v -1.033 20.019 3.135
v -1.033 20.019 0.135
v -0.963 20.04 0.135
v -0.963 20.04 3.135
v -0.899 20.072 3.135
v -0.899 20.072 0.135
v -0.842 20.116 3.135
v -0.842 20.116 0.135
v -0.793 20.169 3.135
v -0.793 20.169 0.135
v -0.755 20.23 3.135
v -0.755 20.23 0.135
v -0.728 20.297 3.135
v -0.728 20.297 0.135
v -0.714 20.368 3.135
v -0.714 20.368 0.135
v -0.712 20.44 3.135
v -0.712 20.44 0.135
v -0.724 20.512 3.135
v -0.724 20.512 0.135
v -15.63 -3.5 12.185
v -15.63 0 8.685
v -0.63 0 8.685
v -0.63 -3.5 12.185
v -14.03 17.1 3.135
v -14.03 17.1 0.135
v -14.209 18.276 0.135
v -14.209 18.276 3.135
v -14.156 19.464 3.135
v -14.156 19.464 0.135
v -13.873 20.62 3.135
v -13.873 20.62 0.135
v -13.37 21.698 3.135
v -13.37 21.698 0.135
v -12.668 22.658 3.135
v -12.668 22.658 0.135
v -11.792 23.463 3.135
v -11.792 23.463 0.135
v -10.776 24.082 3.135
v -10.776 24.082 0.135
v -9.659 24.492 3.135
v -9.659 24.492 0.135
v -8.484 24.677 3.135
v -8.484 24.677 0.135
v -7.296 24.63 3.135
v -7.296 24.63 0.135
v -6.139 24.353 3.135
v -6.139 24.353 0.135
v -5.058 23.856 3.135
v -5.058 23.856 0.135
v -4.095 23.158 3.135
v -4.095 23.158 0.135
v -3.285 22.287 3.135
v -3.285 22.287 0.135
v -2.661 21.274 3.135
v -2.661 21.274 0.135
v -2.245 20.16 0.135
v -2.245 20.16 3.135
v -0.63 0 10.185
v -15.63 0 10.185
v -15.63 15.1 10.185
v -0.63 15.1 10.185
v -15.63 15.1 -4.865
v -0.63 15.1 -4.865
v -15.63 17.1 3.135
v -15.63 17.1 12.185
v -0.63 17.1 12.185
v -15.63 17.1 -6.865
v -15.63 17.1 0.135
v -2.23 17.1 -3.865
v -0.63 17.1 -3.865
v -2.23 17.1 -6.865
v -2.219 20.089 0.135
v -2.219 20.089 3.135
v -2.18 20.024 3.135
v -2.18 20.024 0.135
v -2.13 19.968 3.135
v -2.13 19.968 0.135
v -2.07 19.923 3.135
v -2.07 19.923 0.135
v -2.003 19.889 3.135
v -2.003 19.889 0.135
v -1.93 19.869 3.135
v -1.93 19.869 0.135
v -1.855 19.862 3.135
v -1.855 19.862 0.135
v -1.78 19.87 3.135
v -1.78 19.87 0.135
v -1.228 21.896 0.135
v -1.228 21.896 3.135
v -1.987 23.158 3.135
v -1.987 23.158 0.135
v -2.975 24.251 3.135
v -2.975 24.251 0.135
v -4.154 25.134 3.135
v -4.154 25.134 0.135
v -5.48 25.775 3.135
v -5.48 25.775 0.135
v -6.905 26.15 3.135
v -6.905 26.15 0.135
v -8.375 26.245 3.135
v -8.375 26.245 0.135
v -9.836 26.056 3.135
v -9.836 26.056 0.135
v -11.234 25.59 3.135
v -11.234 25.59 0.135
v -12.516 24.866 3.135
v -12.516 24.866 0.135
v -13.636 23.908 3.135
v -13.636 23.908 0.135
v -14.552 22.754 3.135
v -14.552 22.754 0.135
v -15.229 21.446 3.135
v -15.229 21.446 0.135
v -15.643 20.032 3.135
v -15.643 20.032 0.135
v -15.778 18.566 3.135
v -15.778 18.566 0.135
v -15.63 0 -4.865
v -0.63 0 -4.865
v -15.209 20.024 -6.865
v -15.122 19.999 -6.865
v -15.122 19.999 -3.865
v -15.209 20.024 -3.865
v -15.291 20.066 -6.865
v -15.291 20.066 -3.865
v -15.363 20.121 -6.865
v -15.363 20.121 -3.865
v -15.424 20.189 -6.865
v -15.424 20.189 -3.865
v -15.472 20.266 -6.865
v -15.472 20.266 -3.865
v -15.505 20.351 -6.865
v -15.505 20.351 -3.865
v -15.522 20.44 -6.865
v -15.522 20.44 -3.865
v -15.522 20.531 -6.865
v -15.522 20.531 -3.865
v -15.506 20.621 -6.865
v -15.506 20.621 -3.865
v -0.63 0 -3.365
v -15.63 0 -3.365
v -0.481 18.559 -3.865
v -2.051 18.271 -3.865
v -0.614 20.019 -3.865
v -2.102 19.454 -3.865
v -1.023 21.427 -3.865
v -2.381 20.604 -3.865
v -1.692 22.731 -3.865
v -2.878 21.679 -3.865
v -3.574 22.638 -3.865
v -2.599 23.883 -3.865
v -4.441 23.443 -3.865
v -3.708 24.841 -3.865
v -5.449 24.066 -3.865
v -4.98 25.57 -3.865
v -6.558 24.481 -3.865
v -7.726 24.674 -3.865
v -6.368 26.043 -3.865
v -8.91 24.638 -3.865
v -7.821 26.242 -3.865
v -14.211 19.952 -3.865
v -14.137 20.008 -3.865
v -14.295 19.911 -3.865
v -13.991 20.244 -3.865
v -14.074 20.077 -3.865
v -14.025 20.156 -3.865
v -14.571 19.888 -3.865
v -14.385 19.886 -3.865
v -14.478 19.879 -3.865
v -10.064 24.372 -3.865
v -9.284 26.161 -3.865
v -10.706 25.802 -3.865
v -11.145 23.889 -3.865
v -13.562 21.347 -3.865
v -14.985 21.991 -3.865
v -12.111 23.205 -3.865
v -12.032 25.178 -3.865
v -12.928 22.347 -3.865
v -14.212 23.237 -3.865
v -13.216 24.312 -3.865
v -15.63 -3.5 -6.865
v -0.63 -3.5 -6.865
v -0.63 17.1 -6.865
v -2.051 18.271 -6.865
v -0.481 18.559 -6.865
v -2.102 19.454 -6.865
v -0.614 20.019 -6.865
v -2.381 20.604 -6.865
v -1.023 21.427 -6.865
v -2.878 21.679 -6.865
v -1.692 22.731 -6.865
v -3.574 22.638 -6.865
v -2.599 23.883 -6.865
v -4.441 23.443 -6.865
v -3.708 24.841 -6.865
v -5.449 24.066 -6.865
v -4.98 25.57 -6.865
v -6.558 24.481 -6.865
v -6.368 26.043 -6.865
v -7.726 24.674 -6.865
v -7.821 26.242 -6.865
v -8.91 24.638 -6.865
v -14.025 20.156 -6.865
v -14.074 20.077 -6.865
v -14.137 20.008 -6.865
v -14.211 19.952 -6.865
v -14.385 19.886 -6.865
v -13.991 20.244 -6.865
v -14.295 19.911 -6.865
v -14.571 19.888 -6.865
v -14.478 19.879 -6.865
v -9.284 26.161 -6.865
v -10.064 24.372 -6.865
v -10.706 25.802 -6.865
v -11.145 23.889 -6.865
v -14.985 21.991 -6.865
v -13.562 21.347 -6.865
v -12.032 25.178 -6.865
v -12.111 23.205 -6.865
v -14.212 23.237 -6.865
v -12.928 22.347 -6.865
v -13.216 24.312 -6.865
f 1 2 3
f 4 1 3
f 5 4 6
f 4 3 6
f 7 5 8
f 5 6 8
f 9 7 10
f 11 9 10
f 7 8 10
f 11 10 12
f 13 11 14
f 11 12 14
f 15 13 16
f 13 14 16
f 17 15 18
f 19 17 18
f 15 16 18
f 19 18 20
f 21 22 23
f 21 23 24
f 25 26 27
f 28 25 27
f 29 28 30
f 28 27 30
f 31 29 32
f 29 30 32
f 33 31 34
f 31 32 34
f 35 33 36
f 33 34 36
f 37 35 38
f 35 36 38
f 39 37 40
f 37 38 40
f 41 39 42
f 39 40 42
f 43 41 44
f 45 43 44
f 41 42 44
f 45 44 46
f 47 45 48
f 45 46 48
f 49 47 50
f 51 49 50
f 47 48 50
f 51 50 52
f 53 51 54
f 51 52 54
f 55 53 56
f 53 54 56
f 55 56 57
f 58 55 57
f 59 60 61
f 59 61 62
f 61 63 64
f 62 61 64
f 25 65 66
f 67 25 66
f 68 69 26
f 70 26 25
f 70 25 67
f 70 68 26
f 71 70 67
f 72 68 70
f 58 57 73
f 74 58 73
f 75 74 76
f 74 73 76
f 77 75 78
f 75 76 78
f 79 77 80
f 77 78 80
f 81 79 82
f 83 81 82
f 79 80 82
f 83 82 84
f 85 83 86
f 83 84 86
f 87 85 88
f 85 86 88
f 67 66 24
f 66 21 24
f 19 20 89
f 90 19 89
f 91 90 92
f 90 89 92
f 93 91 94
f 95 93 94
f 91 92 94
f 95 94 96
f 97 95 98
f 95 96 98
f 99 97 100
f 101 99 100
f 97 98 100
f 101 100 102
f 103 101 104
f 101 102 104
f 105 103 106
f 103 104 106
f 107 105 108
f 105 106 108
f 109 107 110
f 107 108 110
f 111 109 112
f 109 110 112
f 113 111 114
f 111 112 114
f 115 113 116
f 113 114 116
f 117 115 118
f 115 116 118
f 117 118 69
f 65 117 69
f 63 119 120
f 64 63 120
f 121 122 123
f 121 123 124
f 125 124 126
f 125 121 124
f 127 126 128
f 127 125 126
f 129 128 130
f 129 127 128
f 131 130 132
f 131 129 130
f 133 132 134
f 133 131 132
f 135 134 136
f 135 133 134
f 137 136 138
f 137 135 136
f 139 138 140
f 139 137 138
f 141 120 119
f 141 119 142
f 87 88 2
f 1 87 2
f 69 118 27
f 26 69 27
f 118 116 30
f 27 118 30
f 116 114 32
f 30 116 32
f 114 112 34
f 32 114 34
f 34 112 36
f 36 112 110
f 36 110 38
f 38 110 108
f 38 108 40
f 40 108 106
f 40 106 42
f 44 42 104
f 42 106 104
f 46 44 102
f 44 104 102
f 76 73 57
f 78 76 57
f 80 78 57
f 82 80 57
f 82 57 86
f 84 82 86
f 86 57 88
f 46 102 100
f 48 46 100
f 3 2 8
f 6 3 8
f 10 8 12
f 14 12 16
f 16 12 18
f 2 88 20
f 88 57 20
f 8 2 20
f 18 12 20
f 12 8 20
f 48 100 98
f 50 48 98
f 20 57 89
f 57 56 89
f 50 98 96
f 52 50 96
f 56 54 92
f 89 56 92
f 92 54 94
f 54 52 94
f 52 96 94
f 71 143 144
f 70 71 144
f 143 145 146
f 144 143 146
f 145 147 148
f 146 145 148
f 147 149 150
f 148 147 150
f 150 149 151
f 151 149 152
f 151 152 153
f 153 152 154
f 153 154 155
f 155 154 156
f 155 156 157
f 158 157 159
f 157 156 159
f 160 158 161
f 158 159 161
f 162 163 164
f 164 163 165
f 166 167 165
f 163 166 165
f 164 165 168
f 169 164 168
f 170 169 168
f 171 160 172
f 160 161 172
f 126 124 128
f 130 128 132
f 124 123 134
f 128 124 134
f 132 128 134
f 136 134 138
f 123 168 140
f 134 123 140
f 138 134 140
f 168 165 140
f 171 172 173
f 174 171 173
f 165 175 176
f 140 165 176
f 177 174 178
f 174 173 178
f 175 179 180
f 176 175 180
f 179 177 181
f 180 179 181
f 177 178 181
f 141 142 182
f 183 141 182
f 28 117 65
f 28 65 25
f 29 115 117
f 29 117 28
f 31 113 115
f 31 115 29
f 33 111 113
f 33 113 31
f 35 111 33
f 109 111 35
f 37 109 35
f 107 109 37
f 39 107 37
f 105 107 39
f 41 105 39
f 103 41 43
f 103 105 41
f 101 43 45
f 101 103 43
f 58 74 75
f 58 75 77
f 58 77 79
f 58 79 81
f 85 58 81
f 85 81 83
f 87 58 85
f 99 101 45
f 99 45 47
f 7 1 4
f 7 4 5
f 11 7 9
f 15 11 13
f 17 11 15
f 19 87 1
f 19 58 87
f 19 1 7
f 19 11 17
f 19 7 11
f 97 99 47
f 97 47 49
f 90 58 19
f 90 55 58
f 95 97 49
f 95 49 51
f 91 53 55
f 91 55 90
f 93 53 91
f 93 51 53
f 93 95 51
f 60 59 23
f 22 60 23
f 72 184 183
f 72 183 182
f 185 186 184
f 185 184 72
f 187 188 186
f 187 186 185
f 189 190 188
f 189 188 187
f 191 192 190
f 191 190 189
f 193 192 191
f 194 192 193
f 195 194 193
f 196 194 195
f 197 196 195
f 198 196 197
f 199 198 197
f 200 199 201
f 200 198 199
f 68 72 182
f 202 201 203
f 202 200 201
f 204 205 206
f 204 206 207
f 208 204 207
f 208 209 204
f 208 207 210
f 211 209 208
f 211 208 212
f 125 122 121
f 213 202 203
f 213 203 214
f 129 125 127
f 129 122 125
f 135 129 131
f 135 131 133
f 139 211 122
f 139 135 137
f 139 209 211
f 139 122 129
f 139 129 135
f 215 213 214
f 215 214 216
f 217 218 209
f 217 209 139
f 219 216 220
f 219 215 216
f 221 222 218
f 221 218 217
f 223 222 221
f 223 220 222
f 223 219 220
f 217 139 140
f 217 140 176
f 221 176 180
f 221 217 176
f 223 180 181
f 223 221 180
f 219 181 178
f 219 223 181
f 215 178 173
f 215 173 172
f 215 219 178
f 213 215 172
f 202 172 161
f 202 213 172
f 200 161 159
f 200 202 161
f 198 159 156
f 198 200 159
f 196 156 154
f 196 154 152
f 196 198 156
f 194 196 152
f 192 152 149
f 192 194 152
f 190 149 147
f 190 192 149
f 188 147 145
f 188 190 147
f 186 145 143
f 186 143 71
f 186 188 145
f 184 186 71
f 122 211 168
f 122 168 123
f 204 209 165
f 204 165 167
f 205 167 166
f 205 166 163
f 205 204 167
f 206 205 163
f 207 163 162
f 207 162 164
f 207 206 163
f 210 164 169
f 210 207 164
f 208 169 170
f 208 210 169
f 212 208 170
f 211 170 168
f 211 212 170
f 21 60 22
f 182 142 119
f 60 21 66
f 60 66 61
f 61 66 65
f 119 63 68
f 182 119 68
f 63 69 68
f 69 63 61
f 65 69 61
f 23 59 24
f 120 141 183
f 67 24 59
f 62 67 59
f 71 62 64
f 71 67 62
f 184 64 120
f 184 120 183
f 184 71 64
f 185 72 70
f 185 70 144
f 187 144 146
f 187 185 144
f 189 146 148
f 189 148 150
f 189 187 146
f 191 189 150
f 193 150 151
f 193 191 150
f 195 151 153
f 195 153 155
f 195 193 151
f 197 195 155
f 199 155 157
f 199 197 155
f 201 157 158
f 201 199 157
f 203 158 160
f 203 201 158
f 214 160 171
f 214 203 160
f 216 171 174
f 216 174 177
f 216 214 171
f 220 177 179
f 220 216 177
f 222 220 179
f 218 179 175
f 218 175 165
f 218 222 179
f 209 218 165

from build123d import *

# Parameters (mm, degrees)
SKETCH_1_W        = 15
SKETCH_1_H        = 2
EXTRUDE_1_DEPTH   = 15.1
EXTRUDE_1_2_DEPTH = 15.1
SKETCH_2_W        = 15
SKETCH_2_H        = 19.05
EXTRUDE_2_DEPTH   = 2
EXTRUDE_3_DEPTH   = 15
EXTRUDE_4_DEPTH   = 3
EXTRUDE_5_DEPTH   = 3


with BuildPart() as part:
    # 草图1 → 凸台-拉伸1 (new body)
    with BuildSketch(Plane(origin=(0, 0, 0), x_dir=(1, 0, 0), z_dir=(0, 1, 0))):
        with Locations((-8.12962963, 5.864814815)):
            Rectangle(SKETCH_1_W, SKETCH_1_H)
    extrude(amount=EXTRUDE_1_DEPTH)



with BuildPart() as body_2:
    # 草图1 → Extrude 1 2 (new body)
    with BuildSketch(Plane(origin=(0, 0, 0), x_dir=(1, 0, 0), z_dir=(0, 1, 0))):
        with Locations((-8.12962963, -11.185185185)):
            Rectangle(SKETCH_1_W, SKETCH_1_H)
    extrude(amount=EXTRUDE_1_2_DEPTH)


with BuildPart() as part_1:
    add(part.part)

    add(body_2.part)  # 凸台-拉伸2 merges body 2
    # 草图2 → 凸台-拉伸2 (add)
    with BuildSketch(Plane(origin=(0, 15.1, 0), x_dir=(1, 0, 0), z_dir=(0, 1, 0))):
        with Locations((-8.12962963, -2.660185185)):
            Rectangle(SKETCH_2_W, SKETCH_2_H)
    extrude(amount=EXTRUDE_2_DEPTH)

    # 草图3 → 凸台-拉伸3 (add)
    with BuildSketch(Plane.ZY.offset(15.62962963)):
        Polygon((-6.864814815, 0), (-3.364814815, 0), (-6.864814815, -3.5), align=None)
        Polygon((12.185185185, 0), (8.685185185, 0), (12.185185185, -3.5), align=None)
    extrude(amount=-EXTRUDE_3_DEPTH)

    # 草图5 → 凸台-拉伸4 (add)
    with BuildSketch(Plane(origin=(0, 0, -6.864814815), x_dir=(-1, 0, 0), z_dir=(0, 0, -1))):
        with BuildLine():
            Line((14.570760421, 19.888226158), (15.122171723, 19.998508419))
            ThreePointArc((15.122171723, 19.998508419), (15.449589497, 20.226176769), (15.506344599, 20.62090976))
            ThreePointArc((15.506344599, 20.62090976), (6.36809587, 26.042916016), (0.62962963, 17.1))
            Line((0.62962963, 17.1), (2.22962963, 17.1))
            ThreePointArc((2.22962963, 17.1), (6.557748265, 24.481257432), (13.991268777, 20.243528676))
            ThreePointArc((13.991268777, 20.243528676), (14.211351698, 19.952258552), (14.570760421, 19.888226158))
        make_face()
    extrude(amount=-EXTRUDE_4_DEPTH)

    # 草图7 → 凸台-拉伸5 (add)
    with BuildSketch(Plane.XY.offset(0.135185185)):
        with BuildLine():
            Line((-1.780026825, 19.869920561), (-1.032692548, 20.019387416))
            ThreePointArc((-1.032692548, 20.019387416), (-0.772321289, 20.199010756), (-0.723833364, 20.511591398))
            ThreePointArc((-0.723833364, 20.511591398), (-9.836075513, 26.055738893), (-15.62962963, 17.1))
            Line((-15.62962963, 17.1), (-14.02962963, 17.1))
            ThreePointArc((-14.02962963, 17.1), (-9.659485473, 24.492329005), (-2.245122699, 20.15967246))
            ThreePointArc((-2.245122699, 20.15967246), (-2.069982872, 19.922647762), (-1.780026825, 19.869920561))
        make_face()
    extrude(amount=EXTRUDE_5_DEPTH)


solid = part_1.part
